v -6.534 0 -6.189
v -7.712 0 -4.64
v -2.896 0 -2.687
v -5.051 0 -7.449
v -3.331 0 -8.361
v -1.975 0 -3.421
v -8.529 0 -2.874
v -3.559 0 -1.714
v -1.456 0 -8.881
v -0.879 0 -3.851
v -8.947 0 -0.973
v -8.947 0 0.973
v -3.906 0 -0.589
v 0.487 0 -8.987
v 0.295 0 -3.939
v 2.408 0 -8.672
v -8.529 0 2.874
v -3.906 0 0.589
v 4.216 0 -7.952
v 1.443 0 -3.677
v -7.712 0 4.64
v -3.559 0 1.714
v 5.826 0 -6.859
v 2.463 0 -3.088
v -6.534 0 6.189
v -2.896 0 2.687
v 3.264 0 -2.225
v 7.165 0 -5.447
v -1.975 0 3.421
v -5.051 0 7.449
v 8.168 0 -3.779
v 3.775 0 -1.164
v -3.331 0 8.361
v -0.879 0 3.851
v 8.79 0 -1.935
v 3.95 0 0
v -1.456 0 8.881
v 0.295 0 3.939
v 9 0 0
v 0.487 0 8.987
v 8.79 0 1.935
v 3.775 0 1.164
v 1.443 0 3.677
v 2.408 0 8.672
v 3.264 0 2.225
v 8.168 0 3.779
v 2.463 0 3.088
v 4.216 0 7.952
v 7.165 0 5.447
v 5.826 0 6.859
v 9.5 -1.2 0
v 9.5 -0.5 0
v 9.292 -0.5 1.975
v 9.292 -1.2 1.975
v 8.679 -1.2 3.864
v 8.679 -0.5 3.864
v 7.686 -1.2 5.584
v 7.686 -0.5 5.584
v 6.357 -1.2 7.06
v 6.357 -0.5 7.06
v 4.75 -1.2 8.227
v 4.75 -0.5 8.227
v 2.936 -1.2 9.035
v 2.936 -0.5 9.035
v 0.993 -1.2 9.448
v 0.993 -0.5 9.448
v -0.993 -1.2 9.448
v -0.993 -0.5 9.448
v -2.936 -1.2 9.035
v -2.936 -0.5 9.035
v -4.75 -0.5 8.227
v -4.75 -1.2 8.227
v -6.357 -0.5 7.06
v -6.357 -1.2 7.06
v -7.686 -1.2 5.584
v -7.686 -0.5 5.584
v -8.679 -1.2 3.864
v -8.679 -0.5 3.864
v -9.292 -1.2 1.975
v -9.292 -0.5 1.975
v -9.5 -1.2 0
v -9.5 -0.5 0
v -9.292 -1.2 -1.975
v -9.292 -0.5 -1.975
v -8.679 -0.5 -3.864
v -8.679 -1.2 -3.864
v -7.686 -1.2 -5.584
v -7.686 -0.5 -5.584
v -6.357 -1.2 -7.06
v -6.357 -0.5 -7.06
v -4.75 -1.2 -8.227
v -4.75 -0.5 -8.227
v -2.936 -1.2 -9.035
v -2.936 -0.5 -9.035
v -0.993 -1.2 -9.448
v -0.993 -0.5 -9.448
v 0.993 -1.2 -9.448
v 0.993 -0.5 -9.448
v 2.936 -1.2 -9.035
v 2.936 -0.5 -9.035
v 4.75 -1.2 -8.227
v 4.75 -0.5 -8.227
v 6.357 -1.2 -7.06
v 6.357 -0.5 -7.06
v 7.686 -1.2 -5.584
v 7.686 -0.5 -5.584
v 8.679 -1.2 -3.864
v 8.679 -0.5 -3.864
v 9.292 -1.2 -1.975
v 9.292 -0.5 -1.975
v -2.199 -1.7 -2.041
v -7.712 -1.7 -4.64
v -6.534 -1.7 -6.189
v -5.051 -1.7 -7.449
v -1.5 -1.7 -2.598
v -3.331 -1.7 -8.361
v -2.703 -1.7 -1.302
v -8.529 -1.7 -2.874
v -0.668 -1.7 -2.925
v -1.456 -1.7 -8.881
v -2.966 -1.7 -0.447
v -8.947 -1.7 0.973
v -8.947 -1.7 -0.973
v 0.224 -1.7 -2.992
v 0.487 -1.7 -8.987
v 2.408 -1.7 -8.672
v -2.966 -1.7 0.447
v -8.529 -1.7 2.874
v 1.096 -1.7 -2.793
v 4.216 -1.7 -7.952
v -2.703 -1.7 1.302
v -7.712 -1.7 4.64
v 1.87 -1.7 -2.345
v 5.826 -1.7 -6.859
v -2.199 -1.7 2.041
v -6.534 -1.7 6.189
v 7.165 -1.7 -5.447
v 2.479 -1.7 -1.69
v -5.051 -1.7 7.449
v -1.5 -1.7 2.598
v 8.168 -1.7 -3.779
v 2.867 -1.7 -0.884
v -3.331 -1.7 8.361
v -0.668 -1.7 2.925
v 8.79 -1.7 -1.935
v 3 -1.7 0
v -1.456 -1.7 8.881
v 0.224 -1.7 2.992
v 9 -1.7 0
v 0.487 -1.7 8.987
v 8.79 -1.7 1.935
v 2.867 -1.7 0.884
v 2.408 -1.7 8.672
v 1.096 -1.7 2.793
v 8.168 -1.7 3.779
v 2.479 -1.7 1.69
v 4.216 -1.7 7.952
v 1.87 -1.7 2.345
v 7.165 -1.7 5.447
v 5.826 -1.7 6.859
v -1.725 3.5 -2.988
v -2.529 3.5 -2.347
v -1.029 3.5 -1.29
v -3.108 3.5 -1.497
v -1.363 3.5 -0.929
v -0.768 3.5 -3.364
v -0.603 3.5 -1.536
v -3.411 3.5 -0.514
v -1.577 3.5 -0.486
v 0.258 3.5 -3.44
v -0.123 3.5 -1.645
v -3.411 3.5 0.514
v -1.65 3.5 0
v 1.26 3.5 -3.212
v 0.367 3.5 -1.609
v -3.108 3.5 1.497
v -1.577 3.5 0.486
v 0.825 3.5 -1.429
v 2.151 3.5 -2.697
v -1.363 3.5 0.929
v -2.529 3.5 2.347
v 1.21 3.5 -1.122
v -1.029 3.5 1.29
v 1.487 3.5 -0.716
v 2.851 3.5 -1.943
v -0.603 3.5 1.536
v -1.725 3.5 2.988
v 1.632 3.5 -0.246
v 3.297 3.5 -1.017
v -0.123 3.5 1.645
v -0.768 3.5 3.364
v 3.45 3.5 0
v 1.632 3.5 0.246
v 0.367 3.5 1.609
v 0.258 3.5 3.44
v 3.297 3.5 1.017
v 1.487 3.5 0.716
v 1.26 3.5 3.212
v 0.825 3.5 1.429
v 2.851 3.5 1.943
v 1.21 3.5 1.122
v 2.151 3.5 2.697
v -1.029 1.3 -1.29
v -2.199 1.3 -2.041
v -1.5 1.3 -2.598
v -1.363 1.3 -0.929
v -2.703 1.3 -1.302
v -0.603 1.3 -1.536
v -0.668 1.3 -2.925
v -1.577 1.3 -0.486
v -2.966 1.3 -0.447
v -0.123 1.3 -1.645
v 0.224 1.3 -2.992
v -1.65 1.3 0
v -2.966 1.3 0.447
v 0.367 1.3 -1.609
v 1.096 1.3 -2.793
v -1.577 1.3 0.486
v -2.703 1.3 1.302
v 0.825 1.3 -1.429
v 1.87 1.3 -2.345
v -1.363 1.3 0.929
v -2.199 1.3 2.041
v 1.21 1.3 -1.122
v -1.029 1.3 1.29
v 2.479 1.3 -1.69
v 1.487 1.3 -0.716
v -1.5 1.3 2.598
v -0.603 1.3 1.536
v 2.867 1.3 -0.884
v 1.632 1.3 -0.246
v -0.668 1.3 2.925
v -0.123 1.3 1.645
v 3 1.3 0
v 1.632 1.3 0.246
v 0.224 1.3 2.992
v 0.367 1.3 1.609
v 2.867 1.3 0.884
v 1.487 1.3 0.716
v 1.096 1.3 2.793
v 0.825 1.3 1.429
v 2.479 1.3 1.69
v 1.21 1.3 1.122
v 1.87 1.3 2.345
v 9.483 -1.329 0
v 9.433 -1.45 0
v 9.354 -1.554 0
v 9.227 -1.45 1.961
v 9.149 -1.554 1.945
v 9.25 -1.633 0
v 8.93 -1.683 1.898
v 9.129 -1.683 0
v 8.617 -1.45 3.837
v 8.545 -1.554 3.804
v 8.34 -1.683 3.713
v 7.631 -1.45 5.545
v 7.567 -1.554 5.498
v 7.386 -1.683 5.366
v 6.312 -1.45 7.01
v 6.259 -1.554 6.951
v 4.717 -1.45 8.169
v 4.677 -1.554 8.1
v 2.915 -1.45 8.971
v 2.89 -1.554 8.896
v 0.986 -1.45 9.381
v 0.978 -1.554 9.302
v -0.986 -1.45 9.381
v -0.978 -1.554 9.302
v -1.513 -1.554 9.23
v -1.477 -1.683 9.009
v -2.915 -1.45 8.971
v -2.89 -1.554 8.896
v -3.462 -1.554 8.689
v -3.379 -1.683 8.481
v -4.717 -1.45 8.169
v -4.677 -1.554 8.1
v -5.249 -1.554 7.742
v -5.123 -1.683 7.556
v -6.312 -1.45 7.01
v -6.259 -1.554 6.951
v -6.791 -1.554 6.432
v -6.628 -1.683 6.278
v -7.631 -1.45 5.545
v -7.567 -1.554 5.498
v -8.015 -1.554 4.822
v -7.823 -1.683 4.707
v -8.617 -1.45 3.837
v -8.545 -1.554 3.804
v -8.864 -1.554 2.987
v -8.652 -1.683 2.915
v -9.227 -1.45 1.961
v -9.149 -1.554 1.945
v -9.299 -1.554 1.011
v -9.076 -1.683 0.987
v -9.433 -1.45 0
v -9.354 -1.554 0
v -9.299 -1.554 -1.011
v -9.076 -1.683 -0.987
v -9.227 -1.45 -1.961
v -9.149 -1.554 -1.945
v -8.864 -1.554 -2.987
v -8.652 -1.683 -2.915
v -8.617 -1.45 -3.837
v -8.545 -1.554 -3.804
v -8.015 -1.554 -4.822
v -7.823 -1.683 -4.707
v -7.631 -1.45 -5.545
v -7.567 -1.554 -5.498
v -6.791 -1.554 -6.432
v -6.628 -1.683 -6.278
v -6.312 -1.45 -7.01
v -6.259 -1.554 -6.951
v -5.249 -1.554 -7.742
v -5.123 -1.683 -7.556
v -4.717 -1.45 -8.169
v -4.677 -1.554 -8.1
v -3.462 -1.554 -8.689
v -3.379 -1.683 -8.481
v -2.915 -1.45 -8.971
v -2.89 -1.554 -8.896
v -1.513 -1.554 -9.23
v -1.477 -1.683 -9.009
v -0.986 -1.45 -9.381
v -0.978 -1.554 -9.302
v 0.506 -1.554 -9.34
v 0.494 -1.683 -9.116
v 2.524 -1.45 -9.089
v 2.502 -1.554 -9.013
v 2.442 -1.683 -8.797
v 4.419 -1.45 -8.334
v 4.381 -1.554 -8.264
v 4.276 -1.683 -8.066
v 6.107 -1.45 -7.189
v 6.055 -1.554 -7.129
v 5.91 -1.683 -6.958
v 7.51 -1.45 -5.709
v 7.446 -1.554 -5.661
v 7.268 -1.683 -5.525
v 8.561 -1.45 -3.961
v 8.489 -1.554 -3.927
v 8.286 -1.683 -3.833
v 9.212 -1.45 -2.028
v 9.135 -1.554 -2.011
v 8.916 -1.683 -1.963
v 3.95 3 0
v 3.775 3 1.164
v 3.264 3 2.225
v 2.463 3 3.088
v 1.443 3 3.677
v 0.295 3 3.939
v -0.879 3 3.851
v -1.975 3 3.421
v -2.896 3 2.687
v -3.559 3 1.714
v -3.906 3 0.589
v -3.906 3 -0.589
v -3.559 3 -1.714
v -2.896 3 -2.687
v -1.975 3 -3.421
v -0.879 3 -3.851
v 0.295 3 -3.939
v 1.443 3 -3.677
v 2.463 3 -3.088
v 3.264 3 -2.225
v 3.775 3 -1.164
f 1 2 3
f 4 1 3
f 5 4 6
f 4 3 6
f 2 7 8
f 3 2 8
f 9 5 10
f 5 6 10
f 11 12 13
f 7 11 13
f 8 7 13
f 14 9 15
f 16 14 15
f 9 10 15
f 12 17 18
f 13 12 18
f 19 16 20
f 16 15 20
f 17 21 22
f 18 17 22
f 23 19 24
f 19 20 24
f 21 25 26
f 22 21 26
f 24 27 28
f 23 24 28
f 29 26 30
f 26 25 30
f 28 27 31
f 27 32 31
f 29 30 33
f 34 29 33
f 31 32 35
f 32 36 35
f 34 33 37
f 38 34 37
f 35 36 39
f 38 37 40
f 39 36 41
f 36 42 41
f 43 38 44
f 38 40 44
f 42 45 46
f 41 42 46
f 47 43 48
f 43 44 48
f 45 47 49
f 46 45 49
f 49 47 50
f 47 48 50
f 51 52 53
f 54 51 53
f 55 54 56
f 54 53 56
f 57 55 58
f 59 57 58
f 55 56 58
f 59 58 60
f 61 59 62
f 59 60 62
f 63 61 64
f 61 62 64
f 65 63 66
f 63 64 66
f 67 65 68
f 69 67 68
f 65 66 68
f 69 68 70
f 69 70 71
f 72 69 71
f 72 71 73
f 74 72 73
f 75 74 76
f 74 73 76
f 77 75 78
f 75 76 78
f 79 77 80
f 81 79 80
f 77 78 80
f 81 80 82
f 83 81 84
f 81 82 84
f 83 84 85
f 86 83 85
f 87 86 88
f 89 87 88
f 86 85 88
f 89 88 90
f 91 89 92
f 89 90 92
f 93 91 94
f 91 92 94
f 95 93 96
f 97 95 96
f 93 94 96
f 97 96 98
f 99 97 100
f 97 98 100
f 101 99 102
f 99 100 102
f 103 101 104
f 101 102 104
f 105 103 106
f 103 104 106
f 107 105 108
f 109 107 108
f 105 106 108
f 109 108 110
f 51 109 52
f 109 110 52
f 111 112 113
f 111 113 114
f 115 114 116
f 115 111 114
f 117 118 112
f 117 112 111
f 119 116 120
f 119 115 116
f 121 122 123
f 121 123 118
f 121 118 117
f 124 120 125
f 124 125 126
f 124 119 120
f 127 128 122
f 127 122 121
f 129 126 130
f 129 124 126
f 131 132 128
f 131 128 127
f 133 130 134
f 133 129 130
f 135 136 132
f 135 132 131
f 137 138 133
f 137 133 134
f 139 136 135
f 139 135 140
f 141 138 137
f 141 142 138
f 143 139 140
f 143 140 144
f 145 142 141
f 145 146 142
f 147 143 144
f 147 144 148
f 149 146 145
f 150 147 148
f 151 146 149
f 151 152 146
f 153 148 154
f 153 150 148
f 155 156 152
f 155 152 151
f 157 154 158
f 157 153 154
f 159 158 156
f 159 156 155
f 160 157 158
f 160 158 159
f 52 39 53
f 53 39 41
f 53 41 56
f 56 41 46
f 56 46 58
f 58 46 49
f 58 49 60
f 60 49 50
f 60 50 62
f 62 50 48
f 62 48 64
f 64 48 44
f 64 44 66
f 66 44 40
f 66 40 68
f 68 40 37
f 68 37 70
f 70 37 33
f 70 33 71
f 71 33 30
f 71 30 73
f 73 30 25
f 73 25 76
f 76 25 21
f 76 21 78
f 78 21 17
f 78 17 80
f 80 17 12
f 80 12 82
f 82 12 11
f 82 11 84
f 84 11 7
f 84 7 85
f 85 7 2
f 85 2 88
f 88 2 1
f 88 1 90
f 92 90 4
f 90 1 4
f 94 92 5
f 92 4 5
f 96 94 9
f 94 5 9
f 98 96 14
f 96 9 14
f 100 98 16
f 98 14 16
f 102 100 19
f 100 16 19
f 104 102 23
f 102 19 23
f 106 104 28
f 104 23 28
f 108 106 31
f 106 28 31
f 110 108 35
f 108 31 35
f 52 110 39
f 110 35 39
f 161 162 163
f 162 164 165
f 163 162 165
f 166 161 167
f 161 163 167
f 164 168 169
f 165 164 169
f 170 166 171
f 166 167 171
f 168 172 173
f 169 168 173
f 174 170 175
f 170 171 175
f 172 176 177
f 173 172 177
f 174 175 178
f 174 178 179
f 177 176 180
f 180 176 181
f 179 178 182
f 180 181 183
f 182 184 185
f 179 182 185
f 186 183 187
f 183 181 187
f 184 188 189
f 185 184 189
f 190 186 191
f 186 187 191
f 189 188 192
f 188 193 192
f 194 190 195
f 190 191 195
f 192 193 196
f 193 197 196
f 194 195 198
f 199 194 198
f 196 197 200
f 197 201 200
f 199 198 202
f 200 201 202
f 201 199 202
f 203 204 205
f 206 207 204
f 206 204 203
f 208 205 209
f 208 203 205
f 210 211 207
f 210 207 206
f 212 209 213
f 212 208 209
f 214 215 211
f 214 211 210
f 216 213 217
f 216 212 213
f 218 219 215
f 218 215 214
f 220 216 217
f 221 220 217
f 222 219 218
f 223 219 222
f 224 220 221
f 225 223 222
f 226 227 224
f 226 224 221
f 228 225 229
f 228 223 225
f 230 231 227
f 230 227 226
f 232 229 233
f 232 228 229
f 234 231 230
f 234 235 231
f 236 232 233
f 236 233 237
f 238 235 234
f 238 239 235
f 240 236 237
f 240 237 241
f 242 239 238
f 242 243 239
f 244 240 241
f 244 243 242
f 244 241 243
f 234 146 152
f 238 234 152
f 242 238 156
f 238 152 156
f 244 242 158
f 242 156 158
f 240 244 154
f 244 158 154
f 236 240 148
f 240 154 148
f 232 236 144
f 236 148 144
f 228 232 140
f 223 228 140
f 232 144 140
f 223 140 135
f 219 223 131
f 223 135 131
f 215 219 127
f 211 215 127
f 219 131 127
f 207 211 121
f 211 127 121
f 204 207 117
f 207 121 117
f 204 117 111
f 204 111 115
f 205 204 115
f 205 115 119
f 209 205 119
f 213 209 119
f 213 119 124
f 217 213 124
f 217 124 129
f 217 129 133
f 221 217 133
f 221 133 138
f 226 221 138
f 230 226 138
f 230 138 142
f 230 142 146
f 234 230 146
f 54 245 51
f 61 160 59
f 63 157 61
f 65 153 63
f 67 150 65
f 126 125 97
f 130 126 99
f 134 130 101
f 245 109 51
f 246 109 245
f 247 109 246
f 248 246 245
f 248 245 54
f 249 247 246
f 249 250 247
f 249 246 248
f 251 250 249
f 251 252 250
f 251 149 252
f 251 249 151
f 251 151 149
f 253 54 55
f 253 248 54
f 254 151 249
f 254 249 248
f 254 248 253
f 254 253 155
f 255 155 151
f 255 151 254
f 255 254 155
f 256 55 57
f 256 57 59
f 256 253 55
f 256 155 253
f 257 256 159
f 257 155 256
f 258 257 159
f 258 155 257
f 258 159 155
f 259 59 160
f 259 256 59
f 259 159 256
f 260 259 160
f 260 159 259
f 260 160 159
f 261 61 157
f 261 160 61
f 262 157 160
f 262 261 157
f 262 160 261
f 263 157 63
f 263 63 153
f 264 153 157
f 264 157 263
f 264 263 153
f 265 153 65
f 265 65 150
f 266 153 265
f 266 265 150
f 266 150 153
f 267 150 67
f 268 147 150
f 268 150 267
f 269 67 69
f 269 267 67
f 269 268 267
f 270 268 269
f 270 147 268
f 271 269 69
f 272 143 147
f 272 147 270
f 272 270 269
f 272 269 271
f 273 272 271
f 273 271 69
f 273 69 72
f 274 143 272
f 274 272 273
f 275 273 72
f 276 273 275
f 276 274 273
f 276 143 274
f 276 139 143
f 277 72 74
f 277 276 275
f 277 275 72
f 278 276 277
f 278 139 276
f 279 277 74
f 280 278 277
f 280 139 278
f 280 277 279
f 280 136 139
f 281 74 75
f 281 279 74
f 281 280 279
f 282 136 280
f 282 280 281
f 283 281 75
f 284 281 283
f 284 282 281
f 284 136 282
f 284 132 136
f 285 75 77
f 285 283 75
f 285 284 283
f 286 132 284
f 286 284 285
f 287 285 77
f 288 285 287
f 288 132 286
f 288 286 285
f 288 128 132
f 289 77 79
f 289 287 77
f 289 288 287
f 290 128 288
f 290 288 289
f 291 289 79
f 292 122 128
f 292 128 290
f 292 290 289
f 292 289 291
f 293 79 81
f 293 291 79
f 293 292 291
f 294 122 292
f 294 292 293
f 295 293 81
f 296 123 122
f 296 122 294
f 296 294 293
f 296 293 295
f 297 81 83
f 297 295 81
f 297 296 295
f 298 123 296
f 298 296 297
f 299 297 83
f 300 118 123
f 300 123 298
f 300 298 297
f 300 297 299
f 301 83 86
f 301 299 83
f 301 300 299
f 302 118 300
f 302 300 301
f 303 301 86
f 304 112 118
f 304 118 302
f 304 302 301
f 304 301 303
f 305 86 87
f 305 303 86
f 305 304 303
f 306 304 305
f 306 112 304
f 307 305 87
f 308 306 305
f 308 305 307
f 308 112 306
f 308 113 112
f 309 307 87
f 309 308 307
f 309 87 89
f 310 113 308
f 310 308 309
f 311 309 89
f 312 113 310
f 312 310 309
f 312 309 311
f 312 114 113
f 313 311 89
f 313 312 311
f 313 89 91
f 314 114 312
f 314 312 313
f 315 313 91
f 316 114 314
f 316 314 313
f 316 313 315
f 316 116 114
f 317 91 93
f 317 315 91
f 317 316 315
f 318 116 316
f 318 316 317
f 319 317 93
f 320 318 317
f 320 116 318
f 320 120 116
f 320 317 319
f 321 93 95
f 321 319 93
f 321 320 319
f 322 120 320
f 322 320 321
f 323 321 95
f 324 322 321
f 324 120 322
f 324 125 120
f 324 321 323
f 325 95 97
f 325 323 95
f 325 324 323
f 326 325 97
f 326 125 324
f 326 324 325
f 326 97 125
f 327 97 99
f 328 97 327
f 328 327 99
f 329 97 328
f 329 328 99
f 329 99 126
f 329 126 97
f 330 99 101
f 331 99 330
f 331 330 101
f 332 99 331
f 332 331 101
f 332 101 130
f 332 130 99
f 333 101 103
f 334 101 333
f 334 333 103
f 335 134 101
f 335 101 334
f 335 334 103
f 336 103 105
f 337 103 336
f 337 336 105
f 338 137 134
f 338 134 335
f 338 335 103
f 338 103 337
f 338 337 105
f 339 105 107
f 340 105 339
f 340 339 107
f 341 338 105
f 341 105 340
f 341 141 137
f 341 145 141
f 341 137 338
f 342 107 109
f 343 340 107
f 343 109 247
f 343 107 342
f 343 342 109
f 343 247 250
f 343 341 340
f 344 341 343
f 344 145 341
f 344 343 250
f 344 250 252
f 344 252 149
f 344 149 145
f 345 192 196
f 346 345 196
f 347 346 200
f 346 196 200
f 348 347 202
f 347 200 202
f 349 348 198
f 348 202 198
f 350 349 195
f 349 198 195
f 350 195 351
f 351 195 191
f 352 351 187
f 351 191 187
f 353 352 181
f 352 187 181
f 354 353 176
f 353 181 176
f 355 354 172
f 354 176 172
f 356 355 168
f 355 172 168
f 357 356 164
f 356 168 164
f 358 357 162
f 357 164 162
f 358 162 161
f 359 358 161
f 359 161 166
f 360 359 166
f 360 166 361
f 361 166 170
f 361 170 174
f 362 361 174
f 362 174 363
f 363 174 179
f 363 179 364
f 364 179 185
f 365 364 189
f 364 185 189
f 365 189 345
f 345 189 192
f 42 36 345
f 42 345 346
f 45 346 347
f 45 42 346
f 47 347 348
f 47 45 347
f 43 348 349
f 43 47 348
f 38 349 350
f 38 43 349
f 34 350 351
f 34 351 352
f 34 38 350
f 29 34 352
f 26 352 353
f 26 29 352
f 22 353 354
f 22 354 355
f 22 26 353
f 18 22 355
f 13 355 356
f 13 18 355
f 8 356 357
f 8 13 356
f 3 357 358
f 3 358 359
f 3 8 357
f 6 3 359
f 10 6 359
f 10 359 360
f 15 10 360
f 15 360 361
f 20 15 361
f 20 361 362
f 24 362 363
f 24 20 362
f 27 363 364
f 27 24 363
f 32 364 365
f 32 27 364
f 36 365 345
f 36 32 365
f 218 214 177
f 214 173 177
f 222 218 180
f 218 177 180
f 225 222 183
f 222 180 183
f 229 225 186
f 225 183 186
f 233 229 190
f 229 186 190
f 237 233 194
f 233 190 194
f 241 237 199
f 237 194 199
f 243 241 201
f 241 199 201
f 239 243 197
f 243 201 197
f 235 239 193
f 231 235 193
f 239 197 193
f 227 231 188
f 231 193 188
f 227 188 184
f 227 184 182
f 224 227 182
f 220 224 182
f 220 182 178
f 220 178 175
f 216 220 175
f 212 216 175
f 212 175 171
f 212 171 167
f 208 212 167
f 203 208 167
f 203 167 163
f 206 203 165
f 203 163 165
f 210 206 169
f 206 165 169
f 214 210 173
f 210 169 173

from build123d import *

# Parameters (mm, degrees)
F0_R           = 9.5
F1_DEPTH       = 1.7
F2_R           = 3.95
F3_DEPTH       = 3.5
F4_SIZE        = 0.5
F5_R           = 0.5
F7_D           = 3.3
F7_CBORE_D     = 6
F7_CBORE_DEPTH = 3


with BuildPart() as f1:
    # F0 (on Front) → F1 (new body)
    with BuildSketch(Plane.XZ):
        Circle(F0_R)
    extrude(amount=F1_DEPTH)

    # F2 (on Front) → F3 (join)
    with BuildSketch(Plane.XZ):
        Circle(F2_R)
    extrude(amount=-F3_DEPTH)

    # F4
    f4_edges = [f1.edges().sort_by_distance(p)[0] for p in [
        (-3.95, 3.5, 0),
        (-9.5, 0, 0),
    ]]
    chamfer(f4_edges, length=F4_SIZE)

    # F5
    f5_edges = [f1.edges().sort_by_distance(p)[0] for p in [
        (-9.5, -1.7, 0),
    ]]
    fillet(f5_edges, radius=F5_R)

    # F7 (through all)
    with Locations(Plane.XZ.offset(1.7)):
        with Locations((0, 0)):
            CounterBoreHole(F7_D / 2, F7_CBORE_D / 2, F7_CBORE_DEPTH)


solid = f1.part
